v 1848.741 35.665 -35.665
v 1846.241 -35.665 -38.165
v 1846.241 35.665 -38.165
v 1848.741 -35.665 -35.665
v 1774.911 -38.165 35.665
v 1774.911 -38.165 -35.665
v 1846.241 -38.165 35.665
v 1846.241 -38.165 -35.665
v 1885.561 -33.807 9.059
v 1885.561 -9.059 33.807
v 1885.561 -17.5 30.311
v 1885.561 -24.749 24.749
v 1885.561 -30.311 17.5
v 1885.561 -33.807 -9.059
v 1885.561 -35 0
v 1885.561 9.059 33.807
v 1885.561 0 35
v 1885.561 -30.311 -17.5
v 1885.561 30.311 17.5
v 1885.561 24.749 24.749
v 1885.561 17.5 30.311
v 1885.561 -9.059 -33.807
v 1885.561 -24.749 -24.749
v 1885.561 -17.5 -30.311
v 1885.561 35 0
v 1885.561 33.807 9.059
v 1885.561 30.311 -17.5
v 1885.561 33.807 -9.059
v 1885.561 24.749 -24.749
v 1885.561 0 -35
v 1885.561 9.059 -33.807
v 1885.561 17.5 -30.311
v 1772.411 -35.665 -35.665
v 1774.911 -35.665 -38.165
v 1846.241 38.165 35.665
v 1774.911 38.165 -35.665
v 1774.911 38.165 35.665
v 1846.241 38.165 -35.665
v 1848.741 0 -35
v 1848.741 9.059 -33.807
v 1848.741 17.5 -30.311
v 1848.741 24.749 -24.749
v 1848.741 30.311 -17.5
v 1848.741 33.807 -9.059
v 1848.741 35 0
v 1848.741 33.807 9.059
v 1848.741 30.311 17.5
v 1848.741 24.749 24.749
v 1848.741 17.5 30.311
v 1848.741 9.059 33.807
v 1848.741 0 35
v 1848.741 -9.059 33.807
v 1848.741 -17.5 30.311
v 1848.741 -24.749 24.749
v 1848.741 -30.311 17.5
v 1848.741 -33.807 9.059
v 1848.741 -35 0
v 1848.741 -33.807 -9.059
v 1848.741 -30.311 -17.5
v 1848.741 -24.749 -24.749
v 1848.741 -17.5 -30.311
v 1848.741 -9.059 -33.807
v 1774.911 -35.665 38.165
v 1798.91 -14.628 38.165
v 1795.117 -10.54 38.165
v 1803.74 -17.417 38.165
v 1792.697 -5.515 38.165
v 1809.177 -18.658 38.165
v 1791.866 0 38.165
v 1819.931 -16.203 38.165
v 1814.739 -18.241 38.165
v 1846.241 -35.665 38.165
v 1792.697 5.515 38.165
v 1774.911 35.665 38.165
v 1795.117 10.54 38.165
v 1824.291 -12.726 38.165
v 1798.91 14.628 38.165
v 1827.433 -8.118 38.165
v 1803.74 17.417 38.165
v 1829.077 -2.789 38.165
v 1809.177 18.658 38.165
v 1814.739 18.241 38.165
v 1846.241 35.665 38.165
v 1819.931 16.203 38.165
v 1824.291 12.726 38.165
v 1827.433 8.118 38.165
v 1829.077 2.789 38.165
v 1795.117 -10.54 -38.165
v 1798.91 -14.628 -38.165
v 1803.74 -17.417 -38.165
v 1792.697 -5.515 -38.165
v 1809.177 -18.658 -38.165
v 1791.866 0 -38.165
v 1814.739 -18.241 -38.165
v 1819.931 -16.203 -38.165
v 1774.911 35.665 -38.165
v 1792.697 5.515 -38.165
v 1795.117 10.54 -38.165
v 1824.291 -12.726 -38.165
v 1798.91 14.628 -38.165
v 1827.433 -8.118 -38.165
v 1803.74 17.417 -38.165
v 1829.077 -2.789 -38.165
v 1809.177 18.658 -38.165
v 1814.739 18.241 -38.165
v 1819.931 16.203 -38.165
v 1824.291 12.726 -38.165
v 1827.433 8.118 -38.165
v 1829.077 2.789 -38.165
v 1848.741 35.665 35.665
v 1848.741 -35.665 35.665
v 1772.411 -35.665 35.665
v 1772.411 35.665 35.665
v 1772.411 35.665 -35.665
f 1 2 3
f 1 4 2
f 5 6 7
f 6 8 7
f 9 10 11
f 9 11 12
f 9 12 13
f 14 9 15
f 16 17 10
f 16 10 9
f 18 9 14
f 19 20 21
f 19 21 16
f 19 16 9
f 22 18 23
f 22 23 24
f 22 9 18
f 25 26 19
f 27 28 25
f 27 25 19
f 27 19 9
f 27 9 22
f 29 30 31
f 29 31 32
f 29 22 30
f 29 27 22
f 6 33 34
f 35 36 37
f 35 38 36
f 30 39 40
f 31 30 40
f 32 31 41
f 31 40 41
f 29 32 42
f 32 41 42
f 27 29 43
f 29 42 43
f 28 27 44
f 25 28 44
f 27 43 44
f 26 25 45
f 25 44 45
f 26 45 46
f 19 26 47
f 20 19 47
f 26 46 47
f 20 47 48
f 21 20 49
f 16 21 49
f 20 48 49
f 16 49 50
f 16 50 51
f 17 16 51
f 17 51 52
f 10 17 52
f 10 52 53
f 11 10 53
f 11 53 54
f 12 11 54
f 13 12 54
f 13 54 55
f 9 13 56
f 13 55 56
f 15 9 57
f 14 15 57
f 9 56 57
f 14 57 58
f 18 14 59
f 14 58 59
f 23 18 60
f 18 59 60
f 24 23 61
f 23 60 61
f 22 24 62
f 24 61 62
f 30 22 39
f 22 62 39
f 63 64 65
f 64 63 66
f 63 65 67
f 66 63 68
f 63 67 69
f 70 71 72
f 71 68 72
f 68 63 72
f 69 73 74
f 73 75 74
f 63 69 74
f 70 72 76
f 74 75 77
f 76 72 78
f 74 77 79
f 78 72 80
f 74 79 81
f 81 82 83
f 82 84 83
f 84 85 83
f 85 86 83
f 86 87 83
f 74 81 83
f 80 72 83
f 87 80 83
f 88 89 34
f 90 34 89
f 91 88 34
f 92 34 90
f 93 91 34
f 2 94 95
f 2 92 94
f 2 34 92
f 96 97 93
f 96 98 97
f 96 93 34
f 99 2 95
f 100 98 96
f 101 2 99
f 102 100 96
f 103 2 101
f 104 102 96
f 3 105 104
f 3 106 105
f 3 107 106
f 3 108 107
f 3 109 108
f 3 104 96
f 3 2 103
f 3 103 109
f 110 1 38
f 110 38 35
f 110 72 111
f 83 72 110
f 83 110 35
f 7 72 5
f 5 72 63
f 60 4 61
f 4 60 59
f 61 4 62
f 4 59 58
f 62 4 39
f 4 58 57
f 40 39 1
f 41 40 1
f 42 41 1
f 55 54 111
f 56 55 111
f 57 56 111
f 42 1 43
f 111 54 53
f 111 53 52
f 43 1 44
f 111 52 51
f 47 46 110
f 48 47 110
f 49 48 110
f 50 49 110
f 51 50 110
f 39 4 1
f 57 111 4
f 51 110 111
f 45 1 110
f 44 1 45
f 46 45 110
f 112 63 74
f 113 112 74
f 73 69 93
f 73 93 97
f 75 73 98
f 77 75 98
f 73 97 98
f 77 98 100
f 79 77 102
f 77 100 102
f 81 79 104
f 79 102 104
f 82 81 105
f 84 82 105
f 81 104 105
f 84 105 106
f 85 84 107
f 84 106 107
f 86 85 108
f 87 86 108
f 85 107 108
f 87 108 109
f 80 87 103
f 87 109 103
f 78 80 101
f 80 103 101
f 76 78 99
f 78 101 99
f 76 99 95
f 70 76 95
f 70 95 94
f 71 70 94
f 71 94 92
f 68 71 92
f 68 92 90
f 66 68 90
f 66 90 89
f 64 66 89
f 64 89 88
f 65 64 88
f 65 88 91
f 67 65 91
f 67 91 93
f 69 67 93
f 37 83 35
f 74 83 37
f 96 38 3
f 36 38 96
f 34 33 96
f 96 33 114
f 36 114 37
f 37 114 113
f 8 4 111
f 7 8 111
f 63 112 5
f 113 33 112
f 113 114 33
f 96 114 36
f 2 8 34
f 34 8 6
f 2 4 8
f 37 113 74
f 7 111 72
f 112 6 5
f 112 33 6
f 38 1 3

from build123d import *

# Parameters (mm, degrees)
SKETCH1_W           = 76.33
SKETCH1_H           = 76.33
BOSS_EXTRUDE1_DEPTH = 76.33
SKETCH2_R           = 35
BOSS_EXTRUDE2_DEPTH = 36.82
CHAMFER1_SIZE       = 2.5
CUT_EXTRUDE1_REACH  = 78.33
SKETCH3_R           = 18.71


with BuildPart() as part:
    # Sketch1 → Boss-Extrude1 (new body)
    with BuildSketch(Plane.ZY.offset(-1848.740517551)):
        Rectangle(SKETCH1_W, SKETCH1_H)
    extrude(amount=BOSS_EXTRUDE1_DEPTH)

    # Sketch2 → Boss-Extrude2 (add)
    with BuildSketch(Plane(origin=(1848.740517551, 0, 0), x_dir=(0, 0, -1), z_dir=(1, 0, 0))):
        Circle(SKETCH2_R)
    extrude(amount=BOSS_EXTRUDE2_DEPTH)

    # Chamfer1
    chamfer1_edges = [part.edges().sort_by_distance(p)[0] for p in [
        (1772.410517551, -38.165, 0),
        (1772.410517551, 0, -38.165),
        (1772.410517551, 38.165, 0),
        (1848.740517551, 0, -38.165),
        (1848.740517551, -38.165, 0),
        (1848.740517551, 0, 38.165),
        (1848.740517551, 38.165, 0),
        (1772.410517551, 0, 38.165),
        (1810.575517551, 38.165, -38.165),
        (1810.575517551, -38.165, -38.165),
        (1810.575517551, -38.165, 38.165),
        (1810.575517551, 38.165, 38.165),
    ]]
    chamfer(chamfer1_edges, length=CHAMFER1_SIZE)

    # Sketch3 → Cut-Extrude1 (cut, up to next)
    with BuildSketch(Plane(origin=(0, 0, -38.165), x_dir=(-1, 0, 0), z_dir=(0, 0, -1)), mode=Mode.PRIVATE) as cut_extrude1_sk1:
        with Locations((-1810.575517551, 0)):
            Circle(SKETCH3_R)
    cut_extrude1_tool1 = extrude(cut_extrude1_sk1.sketch, amount=-CUT_EXTRUDE1_REACH, mode=Mode.PRIVATE) & part.part
    add(cut_extrude1_tool1.solids().sort_by_distance((1810.575518, 0, -38.165))[0], mode=Mode.SUBTRACT)


solid = part.part
